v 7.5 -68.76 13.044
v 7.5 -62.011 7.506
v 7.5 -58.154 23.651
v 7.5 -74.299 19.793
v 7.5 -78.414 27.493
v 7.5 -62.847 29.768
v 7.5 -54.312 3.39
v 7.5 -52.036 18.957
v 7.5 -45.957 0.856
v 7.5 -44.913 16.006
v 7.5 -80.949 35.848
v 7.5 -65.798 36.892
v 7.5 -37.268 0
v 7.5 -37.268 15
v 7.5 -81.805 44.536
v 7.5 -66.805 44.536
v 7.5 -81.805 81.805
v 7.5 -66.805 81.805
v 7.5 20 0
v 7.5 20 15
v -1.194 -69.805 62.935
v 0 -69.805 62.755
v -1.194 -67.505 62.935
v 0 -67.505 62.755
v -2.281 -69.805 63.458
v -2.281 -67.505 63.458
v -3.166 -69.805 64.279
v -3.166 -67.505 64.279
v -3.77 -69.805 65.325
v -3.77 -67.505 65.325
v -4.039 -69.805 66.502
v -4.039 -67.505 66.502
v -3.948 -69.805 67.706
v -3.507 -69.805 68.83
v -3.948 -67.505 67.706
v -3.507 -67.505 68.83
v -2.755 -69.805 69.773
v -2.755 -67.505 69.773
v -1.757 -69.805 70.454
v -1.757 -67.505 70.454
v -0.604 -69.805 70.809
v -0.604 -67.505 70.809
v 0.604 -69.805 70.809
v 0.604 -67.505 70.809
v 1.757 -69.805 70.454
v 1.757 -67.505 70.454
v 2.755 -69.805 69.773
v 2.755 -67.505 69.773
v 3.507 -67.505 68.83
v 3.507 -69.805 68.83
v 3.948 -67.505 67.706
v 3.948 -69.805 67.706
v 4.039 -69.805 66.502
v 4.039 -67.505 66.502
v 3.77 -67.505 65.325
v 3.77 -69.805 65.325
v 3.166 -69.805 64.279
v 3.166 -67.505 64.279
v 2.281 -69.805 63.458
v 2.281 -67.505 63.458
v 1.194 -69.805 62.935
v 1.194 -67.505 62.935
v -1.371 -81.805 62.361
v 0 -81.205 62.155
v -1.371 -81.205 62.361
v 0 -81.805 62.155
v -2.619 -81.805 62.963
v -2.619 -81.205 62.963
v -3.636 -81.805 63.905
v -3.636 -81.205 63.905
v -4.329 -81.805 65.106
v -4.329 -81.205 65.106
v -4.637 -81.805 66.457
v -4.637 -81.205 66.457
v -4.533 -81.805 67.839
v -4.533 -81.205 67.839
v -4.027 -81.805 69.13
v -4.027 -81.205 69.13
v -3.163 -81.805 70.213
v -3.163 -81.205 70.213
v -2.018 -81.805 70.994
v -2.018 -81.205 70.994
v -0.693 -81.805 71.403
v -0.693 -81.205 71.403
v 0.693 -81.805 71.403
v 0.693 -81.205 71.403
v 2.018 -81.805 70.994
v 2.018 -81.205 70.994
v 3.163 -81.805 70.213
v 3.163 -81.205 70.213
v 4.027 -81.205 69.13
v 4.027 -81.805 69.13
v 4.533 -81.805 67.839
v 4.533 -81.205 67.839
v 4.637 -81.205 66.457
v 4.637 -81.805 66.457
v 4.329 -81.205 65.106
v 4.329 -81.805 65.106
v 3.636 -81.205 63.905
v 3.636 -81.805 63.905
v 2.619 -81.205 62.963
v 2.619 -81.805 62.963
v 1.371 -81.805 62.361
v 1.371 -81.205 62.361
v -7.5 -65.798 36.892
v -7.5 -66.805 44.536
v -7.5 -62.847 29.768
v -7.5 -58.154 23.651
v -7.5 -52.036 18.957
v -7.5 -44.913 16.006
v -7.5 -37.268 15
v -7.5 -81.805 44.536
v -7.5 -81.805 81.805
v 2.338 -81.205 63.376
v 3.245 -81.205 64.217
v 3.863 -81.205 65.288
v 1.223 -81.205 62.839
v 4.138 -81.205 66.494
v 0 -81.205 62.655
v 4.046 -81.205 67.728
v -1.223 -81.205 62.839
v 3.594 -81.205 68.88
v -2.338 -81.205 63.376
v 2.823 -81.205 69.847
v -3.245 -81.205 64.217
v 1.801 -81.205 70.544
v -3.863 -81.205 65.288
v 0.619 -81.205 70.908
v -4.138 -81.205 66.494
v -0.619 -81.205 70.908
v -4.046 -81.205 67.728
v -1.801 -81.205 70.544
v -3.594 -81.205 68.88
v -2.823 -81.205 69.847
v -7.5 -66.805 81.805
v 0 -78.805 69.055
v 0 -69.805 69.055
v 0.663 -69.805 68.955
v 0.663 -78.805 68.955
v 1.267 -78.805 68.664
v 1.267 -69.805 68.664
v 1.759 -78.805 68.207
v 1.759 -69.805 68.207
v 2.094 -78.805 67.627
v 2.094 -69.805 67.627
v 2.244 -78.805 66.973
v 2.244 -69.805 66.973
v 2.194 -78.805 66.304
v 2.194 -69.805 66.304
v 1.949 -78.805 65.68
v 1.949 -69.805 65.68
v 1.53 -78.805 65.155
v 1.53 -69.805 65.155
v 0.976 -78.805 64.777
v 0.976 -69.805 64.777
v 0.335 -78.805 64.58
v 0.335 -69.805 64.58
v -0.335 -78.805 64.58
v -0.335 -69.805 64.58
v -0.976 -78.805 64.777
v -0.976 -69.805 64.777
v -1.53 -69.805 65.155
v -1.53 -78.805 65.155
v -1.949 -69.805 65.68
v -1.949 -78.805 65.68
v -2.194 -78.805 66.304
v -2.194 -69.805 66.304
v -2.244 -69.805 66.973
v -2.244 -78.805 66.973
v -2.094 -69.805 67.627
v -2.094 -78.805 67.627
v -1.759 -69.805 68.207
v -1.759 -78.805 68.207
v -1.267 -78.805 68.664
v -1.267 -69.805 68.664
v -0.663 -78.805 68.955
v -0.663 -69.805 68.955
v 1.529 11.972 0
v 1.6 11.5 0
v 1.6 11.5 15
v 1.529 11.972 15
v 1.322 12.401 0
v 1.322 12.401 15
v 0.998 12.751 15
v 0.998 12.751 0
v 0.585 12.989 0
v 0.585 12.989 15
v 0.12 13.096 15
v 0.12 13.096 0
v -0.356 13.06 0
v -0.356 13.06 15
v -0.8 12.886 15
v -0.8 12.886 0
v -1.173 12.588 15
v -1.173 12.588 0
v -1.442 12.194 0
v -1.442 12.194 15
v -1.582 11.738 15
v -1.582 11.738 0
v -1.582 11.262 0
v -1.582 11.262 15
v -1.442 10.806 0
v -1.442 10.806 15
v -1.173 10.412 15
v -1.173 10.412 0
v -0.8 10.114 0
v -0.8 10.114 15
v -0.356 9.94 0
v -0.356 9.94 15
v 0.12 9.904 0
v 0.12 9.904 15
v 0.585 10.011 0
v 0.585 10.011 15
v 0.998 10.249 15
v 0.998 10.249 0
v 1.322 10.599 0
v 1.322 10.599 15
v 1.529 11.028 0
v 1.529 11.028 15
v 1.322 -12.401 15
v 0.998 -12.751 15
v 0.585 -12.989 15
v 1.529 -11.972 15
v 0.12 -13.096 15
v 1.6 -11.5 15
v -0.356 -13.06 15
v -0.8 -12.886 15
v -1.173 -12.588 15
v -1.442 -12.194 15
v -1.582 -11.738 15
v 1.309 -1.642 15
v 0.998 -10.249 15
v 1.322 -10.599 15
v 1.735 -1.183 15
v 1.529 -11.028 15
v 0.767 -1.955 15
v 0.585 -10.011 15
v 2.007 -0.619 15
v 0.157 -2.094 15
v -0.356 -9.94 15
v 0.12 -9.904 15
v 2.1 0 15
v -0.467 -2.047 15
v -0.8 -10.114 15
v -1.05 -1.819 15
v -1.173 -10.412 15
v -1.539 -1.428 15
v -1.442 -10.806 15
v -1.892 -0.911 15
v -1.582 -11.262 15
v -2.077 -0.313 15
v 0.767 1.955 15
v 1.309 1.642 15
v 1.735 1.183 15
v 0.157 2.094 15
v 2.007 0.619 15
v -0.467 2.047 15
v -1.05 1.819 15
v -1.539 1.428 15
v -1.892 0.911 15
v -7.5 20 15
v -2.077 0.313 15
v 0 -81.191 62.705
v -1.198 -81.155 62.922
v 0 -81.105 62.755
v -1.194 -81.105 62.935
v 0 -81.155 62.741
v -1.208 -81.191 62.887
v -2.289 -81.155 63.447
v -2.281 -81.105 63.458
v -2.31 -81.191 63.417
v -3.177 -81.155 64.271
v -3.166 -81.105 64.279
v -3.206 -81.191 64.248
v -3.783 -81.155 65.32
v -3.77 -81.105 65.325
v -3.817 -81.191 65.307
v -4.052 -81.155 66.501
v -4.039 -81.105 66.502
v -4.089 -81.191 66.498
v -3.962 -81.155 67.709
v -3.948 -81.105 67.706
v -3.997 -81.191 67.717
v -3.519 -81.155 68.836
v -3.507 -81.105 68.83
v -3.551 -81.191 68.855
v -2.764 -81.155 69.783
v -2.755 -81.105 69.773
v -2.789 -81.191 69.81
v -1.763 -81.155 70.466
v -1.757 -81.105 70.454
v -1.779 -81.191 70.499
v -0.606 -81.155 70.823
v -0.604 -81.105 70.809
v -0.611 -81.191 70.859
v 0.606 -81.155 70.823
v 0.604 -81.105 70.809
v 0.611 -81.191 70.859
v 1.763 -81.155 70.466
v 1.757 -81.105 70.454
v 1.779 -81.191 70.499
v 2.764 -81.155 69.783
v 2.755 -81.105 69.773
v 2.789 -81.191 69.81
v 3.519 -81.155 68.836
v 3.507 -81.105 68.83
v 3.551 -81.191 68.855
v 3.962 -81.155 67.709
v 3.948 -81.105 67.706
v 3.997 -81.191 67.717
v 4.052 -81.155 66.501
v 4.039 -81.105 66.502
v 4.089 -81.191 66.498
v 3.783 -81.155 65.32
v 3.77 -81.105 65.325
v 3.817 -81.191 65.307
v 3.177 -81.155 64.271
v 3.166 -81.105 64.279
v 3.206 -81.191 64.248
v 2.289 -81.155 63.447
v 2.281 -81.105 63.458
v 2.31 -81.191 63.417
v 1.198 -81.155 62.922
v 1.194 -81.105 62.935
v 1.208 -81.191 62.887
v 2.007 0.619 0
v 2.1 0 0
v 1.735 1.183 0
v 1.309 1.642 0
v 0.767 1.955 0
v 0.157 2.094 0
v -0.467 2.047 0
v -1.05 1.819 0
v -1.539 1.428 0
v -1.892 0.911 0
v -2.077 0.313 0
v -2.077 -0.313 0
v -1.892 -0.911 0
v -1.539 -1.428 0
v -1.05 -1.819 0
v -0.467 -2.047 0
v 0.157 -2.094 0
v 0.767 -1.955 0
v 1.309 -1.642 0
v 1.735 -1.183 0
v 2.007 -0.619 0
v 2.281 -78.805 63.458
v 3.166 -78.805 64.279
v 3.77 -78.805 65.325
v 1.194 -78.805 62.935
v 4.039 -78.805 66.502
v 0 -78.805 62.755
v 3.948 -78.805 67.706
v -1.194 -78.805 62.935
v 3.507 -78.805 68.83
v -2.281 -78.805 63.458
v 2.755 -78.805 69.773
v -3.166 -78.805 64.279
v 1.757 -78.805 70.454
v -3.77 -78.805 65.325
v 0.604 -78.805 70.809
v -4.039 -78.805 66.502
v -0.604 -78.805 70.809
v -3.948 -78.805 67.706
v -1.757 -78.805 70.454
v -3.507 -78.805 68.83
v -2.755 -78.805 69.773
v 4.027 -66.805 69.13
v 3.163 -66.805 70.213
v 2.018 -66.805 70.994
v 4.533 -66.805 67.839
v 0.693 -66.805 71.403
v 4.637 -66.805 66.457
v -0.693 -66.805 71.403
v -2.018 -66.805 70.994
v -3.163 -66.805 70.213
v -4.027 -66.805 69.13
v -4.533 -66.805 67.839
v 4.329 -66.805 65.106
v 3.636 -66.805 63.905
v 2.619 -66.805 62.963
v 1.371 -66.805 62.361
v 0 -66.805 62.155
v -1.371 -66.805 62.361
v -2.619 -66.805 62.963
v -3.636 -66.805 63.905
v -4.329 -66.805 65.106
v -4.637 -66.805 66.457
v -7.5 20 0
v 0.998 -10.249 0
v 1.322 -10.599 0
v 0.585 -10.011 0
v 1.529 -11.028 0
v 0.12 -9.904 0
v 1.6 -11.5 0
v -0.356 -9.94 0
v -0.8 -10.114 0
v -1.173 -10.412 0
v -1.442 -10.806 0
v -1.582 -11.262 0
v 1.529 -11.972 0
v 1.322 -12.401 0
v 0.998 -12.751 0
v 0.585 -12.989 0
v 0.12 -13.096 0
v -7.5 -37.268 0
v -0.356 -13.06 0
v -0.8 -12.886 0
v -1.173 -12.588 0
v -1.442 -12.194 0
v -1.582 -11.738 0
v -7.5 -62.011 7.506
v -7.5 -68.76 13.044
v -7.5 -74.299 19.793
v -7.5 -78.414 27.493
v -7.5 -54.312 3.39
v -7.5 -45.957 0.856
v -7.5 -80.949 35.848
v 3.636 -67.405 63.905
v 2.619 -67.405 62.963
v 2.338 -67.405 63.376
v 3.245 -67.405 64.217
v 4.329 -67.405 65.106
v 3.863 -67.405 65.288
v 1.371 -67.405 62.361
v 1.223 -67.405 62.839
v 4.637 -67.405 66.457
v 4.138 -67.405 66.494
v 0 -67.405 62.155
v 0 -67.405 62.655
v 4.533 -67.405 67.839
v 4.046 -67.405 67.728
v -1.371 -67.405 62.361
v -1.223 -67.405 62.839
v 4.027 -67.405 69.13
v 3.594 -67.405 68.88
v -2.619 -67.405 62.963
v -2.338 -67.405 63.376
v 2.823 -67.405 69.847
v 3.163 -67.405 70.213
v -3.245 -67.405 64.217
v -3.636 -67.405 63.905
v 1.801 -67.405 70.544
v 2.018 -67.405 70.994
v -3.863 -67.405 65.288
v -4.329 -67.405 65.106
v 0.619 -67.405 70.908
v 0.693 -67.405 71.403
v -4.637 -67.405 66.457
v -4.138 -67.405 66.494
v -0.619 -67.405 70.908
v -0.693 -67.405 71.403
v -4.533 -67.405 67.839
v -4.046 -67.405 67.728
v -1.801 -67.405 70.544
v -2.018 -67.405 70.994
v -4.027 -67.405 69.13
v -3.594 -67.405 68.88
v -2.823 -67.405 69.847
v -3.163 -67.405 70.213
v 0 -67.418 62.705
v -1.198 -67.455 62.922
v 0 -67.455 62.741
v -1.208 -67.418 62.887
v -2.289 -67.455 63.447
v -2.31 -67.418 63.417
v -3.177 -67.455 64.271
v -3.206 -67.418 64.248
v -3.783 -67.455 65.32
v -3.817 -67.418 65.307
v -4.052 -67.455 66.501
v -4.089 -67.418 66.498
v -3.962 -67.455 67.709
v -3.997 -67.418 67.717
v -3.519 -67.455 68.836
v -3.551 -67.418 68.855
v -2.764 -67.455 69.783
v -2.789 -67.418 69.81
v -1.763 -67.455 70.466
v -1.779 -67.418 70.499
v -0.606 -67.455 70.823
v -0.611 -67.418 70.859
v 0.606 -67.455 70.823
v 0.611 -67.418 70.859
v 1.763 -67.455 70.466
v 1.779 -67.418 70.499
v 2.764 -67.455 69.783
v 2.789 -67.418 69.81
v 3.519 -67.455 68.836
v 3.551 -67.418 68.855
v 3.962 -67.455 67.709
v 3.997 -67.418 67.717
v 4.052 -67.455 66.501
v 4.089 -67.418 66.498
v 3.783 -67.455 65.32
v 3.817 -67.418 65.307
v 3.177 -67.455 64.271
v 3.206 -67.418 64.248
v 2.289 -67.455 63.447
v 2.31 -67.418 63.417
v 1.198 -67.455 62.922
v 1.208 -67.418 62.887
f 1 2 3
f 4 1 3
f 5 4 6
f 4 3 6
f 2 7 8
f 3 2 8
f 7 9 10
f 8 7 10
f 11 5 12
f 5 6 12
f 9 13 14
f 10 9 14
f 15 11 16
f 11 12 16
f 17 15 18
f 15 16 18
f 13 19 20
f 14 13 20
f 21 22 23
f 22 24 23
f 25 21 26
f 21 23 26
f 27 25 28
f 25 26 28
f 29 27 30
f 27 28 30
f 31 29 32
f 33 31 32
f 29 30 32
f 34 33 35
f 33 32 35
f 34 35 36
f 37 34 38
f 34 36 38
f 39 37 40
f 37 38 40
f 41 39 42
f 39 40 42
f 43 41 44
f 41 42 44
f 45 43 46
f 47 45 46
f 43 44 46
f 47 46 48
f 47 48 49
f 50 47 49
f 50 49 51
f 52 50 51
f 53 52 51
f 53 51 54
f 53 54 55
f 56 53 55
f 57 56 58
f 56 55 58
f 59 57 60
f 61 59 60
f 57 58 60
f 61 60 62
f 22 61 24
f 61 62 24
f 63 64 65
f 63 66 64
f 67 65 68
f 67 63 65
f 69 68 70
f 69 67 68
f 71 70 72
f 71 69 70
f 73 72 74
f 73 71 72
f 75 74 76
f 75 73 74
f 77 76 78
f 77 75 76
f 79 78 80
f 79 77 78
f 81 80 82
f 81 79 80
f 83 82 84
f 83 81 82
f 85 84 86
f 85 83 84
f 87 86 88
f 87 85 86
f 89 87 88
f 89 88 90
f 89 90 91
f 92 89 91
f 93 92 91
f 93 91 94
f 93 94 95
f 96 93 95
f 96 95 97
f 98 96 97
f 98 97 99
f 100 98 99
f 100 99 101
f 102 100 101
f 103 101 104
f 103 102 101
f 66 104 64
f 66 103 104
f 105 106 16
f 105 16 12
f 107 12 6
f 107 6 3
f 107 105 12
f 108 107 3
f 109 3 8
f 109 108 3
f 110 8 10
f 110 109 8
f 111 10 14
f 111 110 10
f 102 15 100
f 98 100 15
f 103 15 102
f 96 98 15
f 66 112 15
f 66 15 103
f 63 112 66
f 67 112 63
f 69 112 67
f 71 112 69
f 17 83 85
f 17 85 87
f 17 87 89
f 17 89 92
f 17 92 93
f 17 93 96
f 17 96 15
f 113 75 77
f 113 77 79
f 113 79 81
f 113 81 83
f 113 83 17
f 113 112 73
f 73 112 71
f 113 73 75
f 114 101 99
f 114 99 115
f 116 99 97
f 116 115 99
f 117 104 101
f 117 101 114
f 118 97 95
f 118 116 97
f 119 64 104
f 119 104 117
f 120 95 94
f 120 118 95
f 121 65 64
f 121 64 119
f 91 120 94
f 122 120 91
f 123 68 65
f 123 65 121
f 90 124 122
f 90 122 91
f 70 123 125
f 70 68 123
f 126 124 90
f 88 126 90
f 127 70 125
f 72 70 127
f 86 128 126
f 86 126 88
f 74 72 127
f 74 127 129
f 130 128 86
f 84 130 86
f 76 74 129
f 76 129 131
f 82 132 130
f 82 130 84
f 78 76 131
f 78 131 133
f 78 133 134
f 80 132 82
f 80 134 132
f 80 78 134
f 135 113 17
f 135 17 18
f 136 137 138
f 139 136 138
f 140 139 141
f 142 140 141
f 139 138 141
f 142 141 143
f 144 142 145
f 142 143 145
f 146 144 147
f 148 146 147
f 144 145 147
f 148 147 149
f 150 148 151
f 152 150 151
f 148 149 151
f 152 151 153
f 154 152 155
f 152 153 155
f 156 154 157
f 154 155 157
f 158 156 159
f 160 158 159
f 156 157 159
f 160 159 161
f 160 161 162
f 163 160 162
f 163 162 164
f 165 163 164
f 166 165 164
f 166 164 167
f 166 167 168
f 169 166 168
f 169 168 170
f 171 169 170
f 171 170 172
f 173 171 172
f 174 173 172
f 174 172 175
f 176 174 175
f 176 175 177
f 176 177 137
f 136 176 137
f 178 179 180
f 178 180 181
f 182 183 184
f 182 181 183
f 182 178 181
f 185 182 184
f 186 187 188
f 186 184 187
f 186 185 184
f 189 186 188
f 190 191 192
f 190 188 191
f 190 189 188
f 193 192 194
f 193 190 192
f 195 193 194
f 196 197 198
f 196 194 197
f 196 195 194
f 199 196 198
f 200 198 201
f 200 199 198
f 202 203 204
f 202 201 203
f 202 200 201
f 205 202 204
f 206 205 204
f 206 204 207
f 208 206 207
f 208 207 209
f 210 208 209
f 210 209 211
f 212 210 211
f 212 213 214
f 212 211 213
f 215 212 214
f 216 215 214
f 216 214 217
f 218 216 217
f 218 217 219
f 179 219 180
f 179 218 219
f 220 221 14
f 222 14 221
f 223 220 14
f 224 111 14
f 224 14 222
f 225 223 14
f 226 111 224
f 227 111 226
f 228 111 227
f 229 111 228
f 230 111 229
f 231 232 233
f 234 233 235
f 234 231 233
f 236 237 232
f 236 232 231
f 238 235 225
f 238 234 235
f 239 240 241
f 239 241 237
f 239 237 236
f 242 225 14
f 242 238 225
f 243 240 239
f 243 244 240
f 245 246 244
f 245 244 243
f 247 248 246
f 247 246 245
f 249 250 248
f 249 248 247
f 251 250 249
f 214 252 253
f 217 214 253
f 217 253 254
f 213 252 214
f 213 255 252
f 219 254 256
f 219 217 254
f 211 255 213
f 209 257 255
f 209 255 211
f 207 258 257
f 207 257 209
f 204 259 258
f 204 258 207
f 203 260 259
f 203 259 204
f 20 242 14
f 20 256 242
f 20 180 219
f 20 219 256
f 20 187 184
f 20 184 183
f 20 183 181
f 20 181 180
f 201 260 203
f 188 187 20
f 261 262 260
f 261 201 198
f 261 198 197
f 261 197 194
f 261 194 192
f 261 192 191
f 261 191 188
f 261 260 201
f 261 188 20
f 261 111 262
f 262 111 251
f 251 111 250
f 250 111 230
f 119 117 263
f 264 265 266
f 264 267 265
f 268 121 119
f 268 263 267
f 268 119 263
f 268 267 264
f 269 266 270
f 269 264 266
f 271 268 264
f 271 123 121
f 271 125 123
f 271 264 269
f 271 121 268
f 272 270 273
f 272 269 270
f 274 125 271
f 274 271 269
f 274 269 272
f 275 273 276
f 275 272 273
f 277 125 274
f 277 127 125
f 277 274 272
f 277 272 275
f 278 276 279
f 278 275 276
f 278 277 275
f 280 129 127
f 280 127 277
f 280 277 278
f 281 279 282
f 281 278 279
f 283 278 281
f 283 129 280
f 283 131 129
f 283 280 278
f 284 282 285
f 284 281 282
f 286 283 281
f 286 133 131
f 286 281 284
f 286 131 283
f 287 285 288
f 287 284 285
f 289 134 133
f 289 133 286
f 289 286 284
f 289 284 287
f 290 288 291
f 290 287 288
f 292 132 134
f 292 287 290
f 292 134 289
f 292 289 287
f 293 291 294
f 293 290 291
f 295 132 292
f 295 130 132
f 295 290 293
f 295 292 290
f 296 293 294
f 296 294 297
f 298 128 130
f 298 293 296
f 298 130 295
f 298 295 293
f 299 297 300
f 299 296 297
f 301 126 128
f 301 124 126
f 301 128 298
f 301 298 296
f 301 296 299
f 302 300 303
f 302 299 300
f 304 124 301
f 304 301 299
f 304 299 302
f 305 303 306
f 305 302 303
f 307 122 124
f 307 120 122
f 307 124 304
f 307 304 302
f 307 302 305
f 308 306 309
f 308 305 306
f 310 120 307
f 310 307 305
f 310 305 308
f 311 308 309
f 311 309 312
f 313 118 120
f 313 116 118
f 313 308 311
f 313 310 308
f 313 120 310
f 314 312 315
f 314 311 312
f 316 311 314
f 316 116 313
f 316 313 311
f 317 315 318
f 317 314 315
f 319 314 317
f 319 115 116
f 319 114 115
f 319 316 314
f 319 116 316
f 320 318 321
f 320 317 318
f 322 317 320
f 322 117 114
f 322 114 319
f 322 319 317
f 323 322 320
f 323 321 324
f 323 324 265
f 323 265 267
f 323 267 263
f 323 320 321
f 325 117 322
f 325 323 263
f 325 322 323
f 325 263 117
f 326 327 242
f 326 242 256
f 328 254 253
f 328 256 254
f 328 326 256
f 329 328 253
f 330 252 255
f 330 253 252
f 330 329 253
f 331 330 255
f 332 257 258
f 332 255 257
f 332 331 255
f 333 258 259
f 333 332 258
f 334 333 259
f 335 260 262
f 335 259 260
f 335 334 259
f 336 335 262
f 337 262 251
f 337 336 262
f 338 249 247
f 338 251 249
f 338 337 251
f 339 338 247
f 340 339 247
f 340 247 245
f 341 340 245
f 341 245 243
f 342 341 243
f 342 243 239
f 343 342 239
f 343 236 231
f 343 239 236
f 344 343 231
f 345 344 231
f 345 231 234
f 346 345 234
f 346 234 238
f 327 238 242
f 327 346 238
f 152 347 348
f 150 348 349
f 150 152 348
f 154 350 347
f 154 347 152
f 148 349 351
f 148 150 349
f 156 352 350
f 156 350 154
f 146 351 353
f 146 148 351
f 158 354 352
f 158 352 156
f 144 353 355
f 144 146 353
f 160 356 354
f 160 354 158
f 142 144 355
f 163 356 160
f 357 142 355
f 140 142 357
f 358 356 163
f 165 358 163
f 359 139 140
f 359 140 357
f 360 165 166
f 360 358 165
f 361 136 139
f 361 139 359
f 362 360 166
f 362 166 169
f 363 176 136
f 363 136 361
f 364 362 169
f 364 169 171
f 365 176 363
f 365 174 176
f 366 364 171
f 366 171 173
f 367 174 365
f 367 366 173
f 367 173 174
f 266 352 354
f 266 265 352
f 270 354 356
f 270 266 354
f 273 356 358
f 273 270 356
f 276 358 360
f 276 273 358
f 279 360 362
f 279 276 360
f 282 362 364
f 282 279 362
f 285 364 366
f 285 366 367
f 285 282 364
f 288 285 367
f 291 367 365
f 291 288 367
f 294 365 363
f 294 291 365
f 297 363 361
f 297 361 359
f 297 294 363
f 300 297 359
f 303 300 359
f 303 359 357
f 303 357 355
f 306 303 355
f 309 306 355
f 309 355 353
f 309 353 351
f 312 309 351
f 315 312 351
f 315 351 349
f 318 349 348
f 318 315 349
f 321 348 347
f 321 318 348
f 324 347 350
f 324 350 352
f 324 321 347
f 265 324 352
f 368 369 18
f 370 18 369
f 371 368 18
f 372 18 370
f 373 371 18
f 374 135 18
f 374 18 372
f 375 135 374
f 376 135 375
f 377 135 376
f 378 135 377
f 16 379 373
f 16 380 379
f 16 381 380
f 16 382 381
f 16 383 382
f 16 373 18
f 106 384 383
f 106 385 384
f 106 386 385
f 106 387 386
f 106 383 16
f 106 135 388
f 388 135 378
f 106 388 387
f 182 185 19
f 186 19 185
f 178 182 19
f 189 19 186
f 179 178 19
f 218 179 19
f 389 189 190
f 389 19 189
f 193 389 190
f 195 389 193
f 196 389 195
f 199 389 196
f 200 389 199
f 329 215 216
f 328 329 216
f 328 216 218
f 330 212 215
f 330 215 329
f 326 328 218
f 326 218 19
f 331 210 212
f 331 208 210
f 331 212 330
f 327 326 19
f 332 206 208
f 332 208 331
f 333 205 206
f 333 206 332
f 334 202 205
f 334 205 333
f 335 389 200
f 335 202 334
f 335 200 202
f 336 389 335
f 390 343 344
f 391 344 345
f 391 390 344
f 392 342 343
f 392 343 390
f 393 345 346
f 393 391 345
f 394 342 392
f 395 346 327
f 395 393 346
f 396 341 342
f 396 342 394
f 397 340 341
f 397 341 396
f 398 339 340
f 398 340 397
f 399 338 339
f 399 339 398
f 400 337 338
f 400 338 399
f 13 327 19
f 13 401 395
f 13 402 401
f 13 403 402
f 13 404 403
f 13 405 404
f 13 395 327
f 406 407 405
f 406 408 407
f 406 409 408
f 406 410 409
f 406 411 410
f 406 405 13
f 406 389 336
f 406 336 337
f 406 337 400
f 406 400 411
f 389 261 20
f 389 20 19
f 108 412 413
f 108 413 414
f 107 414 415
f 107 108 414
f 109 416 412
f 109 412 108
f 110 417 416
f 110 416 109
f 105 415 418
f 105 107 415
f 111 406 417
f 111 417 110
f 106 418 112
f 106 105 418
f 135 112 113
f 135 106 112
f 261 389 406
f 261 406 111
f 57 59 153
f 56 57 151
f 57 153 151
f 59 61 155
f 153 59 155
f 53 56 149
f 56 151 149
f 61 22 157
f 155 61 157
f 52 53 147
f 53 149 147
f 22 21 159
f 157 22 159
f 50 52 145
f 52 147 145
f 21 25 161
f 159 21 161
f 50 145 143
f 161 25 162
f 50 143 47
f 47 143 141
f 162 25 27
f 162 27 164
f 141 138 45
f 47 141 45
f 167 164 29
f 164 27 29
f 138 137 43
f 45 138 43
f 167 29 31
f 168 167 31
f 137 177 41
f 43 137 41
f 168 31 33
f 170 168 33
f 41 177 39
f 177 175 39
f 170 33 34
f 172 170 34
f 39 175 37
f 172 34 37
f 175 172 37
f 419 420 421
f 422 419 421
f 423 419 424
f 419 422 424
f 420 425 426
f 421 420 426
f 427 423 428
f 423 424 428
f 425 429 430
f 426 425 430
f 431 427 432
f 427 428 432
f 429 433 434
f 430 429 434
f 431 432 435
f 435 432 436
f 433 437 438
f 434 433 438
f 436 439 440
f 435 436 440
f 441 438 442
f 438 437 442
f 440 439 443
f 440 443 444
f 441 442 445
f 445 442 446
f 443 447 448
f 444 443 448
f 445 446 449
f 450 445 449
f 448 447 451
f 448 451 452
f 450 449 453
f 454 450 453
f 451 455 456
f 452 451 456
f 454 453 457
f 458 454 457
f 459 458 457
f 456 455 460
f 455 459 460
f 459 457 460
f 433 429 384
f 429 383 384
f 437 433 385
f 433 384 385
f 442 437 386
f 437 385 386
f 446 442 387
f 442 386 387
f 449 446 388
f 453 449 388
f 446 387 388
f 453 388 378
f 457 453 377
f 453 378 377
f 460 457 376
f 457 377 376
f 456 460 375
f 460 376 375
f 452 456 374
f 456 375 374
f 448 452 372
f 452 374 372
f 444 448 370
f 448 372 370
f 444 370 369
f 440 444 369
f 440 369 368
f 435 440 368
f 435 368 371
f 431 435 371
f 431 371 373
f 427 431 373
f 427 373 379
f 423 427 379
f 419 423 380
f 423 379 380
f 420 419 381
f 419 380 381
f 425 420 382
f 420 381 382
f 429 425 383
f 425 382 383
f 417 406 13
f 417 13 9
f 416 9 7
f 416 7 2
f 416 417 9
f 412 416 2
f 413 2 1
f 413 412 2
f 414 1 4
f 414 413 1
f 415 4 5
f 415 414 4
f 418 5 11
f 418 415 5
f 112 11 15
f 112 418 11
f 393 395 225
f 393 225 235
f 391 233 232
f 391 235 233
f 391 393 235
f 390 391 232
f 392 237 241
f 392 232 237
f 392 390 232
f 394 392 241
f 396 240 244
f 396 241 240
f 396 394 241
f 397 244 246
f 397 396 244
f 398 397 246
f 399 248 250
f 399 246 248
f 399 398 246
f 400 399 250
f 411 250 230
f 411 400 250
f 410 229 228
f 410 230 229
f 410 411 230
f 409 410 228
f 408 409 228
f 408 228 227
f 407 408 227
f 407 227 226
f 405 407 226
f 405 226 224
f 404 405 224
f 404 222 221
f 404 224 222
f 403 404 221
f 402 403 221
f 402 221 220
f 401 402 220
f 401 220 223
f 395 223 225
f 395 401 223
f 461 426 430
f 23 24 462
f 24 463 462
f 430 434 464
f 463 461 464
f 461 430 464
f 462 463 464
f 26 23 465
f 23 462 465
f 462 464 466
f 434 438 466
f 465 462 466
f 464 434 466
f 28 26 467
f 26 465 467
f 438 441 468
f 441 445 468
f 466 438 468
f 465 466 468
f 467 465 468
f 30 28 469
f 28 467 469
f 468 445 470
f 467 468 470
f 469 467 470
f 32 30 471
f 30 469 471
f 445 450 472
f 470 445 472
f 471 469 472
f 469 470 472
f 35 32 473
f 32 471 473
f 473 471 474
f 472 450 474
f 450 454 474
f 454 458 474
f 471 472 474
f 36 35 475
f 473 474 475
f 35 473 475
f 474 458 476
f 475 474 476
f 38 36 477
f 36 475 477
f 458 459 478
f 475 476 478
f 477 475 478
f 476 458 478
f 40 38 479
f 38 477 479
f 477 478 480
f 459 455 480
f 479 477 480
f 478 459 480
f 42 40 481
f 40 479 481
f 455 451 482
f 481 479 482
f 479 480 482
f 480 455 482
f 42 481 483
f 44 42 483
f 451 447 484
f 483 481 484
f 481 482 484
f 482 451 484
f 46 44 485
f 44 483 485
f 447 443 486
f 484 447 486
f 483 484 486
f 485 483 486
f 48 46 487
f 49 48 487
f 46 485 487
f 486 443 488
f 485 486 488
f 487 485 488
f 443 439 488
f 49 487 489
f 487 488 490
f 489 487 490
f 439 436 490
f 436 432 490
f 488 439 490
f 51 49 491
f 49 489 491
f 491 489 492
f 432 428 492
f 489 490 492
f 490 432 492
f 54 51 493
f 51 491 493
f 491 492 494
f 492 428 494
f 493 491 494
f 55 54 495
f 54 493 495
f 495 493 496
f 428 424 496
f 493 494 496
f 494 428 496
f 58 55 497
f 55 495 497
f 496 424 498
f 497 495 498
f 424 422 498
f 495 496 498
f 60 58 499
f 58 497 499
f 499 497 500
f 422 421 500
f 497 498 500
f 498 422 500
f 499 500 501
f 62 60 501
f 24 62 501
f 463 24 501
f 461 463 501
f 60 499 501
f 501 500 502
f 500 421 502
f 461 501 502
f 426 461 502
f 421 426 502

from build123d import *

# Parameters (mm, degrees)
BOSS_EXTRUDE1_DEPTH      = 7.5
BOSS_EXTRUDE1_DEPTH_BACK = 7.5
SKETCH3_R                = 2.25
CUT_EXTRUDE1_DEPTH       = 120.512655858
CUT_EXTRUDE2_DEPTH       = 106.882442604
CUT_EXTRUDE2_DEPTH_BACK  = 106.882442604
SKETCH4_R                = 2.1
SKETCH4_R_2              = 1.6


with BuildPart() as part:
    # Sketch1 → Boss-Extrude1 (new, two sides: drawn at the far end of the back side and taken through both)
    with BuildSketch(Plane(origin=(0, 0, 0), x_dir=(0, 0, -1), z_dir=(1, 0, 0)).offset(-BOSS_EXTRUDE1_DEPTH_BACK)):
        with BuildLine():
            Line((-15, 20), (0, 20))
            Line((0, 20), (0, -37.26819382))
            ThreePointArc((0, -37.26819382), (-13.04440593, -68.76017553), (-44.53638764, -81.80458146))
            Line((-44.53638764, -81.80458146), (-66.80458146, -81.80458146))
            Line((-66.80458146, -81.80458146), (-81.80458146, -81.80458146))
            Line((-81.80458146, -81.80458146), (-81.80458146, -66.80458146))
            Line((-81.80458146, -66.80458146), (-66.80458146, -66.80458146))
            Line((-66.80458146, -66.80458146), (-44.53638764, -66.80458146))
            ThreePointArc((-44.53638764, -66.80458146), (-23.651007648, -58.153573812), (-15, -37.26819382))
            Line((-15, -37.26819382), (-15, 20))
        make_face()
    extrude(amount=BOSS_EXTRUDE1_DEPTH + BOSS_EXTRUDE1_DEPTH_BACK)

    # Sketch3 → Cut-Extrude1 (cut, through all)
    with BuildSketch(Plane(origin=(0, -66.80458146, 0), x_dir=(1, 0, 0), z_dir=(0, 1, 0))):
        with Locations((0, -66.80458146)):
            Circle(SKETCH3_R)
    extrude(amount=-CUT_EXTRUDE1_DEPTH, mode=Mode.SUBTRACT)

    # Sketch4 → Cut-Extrude2 (cut, two sides: drawn at the far end of the back side and taken through both)
    with BuildSketch(Plane.XY.offset(15).offset(-CUT_EXTRUDE2_DEPTH_BACK)):
        Circle(SKETCH4_R)
        with Locations((0, 11.5)):
            Circle(SKETCH4_R_2)
        with Locations((0, -11.5)):
            Circle(SKETCH4_R_2)
    extrude(amount=CUT_EXTRUDE2_DEPTH + CUT_EXTRUDE2_DEPTH_BACK, mode=Mode.SUBTRACT)

    # Sketch5 → Cut-Revolve1 (revolve, cut)
    with BuildSketch(Plane(origin=(0, 0, 0), x_dir=(0, 0, -1), z_dir=(1, 0, 0))):
        with BuildLine():
            Line((-62.75458146, -78.80458146), (-62.75458146, -81.10458146))
            ThreePointArc((-62.75458146, -81.10458146), (-62.725292138, -81.175292138), (-62.65458146, -81.20458146))
            Line((-62.65458146, -81.20458146), (-62.15458146, -81.20458146))
            Line((-62.15458146, -81.20458146), (-62.15458146, -81.80458146))
            Line((-62.15458146, -81.80458146), (-66.80458146, -81.80458146))
            Line((-66.80458146, -81.80458146), (-66.80458146, -78.80458146))
            Line((-66.80458146, -78.80458146), (-62.75458146, -78.80458146))
        make_face()
        with BuildLine():
            Line((-66.80458146, -69.80458146), (-62.75458146, -69.80458146))
            Line((-62.75458146, -69.80458146), (-62.75458146, -67.50458146))
            ThreePointArc((-62.75458146, -67.50458146), (-62.725292138, -67.433870782), (-62.65458146, -67.40458146))
            Line((-62.65458146, -67.40458146), (-62.15458146, -67.40458146))
            Line((-62.15458146, -67.40458146), (-62.15458146, -66.80458146))
            Line((-62.15458146, -66.80458146), (-66.80458146, -66.80458146))
            Line((-66.80458146, -66.80458146), (-66.80458146, -69.80458146))
        make_face()
    revolve(axis=Axis((0, -52.168735771, 66.80458146), (0, 1, 0)), mode=Mode.SUBTRACT)


solid = part.part
